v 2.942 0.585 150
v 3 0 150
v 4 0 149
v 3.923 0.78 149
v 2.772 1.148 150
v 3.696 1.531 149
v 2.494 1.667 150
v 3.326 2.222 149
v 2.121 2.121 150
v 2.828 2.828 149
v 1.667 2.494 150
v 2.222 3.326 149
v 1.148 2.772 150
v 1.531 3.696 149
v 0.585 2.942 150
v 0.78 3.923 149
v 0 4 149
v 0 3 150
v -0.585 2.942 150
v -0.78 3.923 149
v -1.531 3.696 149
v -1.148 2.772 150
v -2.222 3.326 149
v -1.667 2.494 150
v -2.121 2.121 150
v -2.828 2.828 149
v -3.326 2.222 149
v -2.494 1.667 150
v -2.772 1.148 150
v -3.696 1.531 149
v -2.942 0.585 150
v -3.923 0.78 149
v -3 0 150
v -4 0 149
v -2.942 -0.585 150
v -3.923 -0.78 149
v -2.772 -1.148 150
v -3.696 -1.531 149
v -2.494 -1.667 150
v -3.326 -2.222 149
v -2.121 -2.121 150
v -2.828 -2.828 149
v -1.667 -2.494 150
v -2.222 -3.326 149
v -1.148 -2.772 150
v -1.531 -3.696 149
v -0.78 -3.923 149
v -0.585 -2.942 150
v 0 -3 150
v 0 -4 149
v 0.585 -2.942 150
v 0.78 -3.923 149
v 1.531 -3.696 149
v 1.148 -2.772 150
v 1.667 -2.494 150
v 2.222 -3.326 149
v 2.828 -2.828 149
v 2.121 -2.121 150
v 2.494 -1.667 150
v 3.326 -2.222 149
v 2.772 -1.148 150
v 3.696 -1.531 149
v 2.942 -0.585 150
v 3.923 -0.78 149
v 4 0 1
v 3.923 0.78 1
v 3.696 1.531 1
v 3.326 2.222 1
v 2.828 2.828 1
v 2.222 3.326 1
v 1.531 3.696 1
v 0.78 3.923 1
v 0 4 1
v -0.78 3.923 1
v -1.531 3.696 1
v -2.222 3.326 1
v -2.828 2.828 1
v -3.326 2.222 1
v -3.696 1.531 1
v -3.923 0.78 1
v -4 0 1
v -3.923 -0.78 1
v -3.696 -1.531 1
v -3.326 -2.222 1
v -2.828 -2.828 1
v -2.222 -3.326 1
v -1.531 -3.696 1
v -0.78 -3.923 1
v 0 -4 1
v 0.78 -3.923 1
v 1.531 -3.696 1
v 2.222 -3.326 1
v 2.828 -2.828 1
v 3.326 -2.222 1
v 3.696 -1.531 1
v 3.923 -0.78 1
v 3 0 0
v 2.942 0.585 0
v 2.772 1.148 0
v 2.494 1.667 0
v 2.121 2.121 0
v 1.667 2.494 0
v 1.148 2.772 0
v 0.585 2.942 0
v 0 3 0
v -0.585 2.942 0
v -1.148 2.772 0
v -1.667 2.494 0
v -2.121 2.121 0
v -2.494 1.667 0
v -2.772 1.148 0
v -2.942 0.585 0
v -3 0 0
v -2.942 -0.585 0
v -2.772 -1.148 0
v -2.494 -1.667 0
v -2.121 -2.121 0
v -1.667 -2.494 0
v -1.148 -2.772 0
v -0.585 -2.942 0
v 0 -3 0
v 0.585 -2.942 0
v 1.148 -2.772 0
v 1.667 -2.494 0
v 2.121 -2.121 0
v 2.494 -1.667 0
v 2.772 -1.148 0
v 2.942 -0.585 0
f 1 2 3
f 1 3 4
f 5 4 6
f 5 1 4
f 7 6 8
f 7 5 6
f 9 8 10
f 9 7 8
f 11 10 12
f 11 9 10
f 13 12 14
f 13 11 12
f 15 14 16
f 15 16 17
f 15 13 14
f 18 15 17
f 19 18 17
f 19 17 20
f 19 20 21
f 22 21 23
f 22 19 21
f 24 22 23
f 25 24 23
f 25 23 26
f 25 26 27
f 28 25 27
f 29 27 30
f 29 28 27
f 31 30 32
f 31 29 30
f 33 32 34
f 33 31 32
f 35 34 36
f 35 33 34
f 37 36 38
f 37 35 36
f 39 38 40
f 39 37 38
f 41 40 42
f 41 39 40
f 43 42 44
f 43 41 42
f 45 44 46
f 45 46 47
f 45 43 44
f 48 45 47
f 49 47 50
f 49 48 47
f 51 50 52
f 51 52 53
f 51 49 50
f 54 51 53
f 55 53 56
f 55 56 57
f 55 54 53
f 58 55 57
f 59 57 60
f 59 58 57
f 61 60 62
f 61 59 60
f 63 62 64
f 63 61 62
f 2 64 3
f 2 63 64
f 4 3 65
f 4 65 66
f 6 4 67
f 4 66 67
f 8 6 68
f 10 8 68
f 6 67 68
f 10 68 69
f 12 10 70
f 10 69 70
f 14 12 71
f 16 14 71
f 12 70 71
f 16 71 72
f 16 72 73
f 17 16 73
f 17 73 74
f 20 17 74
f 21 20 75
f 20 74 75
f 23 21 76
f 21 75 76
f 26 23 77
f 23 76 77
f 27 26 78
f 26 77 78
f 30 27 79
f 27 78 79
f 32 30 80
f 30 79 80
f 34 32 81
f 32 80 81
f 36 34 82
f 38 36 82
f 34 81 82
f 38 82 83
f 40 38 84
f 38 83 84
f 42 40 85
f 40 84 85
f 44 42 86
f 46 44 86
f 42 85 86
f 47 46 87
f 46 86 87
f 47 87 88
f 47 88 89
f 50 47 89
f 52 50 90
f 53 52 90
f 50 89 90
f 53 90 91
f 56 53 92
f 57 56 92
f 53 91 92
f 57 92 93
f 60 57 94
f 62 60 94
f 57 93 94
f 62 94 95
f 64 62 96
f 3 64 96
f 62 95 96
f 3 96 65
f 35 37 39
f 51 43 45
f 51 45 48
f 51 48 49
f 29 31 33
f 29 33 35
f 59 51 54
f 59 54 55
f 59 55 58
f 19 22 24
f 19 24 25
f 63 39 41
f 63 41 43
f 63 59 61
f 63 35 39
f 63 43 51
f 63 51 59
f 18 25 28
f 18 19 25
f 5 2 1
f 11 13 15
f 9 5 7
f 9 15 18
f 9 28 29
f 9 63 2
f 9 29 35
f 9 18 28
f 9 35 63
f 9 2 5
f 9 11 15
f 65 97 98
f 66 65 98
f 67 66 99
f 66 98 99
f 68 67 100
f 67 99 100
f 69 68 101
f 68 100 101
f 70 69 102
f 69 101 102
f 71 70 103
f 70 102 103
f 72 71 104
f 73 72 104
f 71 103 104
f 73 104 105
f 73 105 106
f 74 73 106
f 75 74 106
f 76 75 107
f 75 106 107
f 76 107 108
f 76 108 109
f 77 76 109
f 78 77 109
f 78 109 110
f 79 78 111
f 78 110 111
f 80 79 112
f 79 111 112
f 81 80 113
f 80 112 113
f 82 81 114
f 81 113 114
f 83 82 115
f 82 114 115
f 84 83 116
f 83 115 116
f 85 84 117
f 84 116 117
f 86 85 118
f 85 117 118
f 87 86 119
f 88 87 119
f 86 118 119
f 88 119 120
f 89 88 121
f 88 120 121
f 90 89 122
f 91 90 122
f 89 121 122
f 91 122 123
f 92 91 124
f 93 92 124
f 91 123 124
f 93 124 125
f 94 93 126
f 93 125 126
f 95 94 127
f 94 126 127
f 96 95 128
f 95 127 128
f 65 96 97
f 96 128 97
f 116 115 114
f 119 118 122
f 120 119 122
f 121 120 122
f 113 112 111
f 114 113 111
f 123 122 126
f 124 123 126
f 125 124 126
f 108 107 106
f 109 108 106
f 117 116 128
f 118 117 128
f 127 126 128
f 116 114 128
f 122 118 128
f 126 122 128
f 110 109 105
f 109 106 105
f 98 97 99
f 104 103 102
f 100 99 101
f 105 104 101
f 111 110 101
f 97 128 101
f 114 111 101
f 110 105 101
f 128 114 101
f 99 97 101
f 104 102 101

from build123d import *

# Parameters (mm, degrees)
CYLINDER_R      = 4
CYLINDER_DEPTH  = 150
CHAMFER_SIZE    = 1
CHAMFER001_SIZE = 1


with BuildPart() as part:
    # Cylinder → Cylinder (new body)
    with BuildSketch(Plane.XY):
        Circle(CYLINDER_R)
    extrude(amount=CYLINDER_DEPTH)

    # Chamfer
    chamfer_edges = [part.edges().sort_by_distance(p)[0] for p in [
        (-4, 0, 150),
    ]]
    chamfer(chamfer_edges, length=CHAMFER_SIZE)

    # Chamfer001
    chamfer001_edges = [part.edges().sort_by_distance(p)[0] for p in [
        (-4, 0, 0),
    ]]
    chamfer(chamfer001_edges, length=CHAMFER001_SIZE)


solid = part.part
